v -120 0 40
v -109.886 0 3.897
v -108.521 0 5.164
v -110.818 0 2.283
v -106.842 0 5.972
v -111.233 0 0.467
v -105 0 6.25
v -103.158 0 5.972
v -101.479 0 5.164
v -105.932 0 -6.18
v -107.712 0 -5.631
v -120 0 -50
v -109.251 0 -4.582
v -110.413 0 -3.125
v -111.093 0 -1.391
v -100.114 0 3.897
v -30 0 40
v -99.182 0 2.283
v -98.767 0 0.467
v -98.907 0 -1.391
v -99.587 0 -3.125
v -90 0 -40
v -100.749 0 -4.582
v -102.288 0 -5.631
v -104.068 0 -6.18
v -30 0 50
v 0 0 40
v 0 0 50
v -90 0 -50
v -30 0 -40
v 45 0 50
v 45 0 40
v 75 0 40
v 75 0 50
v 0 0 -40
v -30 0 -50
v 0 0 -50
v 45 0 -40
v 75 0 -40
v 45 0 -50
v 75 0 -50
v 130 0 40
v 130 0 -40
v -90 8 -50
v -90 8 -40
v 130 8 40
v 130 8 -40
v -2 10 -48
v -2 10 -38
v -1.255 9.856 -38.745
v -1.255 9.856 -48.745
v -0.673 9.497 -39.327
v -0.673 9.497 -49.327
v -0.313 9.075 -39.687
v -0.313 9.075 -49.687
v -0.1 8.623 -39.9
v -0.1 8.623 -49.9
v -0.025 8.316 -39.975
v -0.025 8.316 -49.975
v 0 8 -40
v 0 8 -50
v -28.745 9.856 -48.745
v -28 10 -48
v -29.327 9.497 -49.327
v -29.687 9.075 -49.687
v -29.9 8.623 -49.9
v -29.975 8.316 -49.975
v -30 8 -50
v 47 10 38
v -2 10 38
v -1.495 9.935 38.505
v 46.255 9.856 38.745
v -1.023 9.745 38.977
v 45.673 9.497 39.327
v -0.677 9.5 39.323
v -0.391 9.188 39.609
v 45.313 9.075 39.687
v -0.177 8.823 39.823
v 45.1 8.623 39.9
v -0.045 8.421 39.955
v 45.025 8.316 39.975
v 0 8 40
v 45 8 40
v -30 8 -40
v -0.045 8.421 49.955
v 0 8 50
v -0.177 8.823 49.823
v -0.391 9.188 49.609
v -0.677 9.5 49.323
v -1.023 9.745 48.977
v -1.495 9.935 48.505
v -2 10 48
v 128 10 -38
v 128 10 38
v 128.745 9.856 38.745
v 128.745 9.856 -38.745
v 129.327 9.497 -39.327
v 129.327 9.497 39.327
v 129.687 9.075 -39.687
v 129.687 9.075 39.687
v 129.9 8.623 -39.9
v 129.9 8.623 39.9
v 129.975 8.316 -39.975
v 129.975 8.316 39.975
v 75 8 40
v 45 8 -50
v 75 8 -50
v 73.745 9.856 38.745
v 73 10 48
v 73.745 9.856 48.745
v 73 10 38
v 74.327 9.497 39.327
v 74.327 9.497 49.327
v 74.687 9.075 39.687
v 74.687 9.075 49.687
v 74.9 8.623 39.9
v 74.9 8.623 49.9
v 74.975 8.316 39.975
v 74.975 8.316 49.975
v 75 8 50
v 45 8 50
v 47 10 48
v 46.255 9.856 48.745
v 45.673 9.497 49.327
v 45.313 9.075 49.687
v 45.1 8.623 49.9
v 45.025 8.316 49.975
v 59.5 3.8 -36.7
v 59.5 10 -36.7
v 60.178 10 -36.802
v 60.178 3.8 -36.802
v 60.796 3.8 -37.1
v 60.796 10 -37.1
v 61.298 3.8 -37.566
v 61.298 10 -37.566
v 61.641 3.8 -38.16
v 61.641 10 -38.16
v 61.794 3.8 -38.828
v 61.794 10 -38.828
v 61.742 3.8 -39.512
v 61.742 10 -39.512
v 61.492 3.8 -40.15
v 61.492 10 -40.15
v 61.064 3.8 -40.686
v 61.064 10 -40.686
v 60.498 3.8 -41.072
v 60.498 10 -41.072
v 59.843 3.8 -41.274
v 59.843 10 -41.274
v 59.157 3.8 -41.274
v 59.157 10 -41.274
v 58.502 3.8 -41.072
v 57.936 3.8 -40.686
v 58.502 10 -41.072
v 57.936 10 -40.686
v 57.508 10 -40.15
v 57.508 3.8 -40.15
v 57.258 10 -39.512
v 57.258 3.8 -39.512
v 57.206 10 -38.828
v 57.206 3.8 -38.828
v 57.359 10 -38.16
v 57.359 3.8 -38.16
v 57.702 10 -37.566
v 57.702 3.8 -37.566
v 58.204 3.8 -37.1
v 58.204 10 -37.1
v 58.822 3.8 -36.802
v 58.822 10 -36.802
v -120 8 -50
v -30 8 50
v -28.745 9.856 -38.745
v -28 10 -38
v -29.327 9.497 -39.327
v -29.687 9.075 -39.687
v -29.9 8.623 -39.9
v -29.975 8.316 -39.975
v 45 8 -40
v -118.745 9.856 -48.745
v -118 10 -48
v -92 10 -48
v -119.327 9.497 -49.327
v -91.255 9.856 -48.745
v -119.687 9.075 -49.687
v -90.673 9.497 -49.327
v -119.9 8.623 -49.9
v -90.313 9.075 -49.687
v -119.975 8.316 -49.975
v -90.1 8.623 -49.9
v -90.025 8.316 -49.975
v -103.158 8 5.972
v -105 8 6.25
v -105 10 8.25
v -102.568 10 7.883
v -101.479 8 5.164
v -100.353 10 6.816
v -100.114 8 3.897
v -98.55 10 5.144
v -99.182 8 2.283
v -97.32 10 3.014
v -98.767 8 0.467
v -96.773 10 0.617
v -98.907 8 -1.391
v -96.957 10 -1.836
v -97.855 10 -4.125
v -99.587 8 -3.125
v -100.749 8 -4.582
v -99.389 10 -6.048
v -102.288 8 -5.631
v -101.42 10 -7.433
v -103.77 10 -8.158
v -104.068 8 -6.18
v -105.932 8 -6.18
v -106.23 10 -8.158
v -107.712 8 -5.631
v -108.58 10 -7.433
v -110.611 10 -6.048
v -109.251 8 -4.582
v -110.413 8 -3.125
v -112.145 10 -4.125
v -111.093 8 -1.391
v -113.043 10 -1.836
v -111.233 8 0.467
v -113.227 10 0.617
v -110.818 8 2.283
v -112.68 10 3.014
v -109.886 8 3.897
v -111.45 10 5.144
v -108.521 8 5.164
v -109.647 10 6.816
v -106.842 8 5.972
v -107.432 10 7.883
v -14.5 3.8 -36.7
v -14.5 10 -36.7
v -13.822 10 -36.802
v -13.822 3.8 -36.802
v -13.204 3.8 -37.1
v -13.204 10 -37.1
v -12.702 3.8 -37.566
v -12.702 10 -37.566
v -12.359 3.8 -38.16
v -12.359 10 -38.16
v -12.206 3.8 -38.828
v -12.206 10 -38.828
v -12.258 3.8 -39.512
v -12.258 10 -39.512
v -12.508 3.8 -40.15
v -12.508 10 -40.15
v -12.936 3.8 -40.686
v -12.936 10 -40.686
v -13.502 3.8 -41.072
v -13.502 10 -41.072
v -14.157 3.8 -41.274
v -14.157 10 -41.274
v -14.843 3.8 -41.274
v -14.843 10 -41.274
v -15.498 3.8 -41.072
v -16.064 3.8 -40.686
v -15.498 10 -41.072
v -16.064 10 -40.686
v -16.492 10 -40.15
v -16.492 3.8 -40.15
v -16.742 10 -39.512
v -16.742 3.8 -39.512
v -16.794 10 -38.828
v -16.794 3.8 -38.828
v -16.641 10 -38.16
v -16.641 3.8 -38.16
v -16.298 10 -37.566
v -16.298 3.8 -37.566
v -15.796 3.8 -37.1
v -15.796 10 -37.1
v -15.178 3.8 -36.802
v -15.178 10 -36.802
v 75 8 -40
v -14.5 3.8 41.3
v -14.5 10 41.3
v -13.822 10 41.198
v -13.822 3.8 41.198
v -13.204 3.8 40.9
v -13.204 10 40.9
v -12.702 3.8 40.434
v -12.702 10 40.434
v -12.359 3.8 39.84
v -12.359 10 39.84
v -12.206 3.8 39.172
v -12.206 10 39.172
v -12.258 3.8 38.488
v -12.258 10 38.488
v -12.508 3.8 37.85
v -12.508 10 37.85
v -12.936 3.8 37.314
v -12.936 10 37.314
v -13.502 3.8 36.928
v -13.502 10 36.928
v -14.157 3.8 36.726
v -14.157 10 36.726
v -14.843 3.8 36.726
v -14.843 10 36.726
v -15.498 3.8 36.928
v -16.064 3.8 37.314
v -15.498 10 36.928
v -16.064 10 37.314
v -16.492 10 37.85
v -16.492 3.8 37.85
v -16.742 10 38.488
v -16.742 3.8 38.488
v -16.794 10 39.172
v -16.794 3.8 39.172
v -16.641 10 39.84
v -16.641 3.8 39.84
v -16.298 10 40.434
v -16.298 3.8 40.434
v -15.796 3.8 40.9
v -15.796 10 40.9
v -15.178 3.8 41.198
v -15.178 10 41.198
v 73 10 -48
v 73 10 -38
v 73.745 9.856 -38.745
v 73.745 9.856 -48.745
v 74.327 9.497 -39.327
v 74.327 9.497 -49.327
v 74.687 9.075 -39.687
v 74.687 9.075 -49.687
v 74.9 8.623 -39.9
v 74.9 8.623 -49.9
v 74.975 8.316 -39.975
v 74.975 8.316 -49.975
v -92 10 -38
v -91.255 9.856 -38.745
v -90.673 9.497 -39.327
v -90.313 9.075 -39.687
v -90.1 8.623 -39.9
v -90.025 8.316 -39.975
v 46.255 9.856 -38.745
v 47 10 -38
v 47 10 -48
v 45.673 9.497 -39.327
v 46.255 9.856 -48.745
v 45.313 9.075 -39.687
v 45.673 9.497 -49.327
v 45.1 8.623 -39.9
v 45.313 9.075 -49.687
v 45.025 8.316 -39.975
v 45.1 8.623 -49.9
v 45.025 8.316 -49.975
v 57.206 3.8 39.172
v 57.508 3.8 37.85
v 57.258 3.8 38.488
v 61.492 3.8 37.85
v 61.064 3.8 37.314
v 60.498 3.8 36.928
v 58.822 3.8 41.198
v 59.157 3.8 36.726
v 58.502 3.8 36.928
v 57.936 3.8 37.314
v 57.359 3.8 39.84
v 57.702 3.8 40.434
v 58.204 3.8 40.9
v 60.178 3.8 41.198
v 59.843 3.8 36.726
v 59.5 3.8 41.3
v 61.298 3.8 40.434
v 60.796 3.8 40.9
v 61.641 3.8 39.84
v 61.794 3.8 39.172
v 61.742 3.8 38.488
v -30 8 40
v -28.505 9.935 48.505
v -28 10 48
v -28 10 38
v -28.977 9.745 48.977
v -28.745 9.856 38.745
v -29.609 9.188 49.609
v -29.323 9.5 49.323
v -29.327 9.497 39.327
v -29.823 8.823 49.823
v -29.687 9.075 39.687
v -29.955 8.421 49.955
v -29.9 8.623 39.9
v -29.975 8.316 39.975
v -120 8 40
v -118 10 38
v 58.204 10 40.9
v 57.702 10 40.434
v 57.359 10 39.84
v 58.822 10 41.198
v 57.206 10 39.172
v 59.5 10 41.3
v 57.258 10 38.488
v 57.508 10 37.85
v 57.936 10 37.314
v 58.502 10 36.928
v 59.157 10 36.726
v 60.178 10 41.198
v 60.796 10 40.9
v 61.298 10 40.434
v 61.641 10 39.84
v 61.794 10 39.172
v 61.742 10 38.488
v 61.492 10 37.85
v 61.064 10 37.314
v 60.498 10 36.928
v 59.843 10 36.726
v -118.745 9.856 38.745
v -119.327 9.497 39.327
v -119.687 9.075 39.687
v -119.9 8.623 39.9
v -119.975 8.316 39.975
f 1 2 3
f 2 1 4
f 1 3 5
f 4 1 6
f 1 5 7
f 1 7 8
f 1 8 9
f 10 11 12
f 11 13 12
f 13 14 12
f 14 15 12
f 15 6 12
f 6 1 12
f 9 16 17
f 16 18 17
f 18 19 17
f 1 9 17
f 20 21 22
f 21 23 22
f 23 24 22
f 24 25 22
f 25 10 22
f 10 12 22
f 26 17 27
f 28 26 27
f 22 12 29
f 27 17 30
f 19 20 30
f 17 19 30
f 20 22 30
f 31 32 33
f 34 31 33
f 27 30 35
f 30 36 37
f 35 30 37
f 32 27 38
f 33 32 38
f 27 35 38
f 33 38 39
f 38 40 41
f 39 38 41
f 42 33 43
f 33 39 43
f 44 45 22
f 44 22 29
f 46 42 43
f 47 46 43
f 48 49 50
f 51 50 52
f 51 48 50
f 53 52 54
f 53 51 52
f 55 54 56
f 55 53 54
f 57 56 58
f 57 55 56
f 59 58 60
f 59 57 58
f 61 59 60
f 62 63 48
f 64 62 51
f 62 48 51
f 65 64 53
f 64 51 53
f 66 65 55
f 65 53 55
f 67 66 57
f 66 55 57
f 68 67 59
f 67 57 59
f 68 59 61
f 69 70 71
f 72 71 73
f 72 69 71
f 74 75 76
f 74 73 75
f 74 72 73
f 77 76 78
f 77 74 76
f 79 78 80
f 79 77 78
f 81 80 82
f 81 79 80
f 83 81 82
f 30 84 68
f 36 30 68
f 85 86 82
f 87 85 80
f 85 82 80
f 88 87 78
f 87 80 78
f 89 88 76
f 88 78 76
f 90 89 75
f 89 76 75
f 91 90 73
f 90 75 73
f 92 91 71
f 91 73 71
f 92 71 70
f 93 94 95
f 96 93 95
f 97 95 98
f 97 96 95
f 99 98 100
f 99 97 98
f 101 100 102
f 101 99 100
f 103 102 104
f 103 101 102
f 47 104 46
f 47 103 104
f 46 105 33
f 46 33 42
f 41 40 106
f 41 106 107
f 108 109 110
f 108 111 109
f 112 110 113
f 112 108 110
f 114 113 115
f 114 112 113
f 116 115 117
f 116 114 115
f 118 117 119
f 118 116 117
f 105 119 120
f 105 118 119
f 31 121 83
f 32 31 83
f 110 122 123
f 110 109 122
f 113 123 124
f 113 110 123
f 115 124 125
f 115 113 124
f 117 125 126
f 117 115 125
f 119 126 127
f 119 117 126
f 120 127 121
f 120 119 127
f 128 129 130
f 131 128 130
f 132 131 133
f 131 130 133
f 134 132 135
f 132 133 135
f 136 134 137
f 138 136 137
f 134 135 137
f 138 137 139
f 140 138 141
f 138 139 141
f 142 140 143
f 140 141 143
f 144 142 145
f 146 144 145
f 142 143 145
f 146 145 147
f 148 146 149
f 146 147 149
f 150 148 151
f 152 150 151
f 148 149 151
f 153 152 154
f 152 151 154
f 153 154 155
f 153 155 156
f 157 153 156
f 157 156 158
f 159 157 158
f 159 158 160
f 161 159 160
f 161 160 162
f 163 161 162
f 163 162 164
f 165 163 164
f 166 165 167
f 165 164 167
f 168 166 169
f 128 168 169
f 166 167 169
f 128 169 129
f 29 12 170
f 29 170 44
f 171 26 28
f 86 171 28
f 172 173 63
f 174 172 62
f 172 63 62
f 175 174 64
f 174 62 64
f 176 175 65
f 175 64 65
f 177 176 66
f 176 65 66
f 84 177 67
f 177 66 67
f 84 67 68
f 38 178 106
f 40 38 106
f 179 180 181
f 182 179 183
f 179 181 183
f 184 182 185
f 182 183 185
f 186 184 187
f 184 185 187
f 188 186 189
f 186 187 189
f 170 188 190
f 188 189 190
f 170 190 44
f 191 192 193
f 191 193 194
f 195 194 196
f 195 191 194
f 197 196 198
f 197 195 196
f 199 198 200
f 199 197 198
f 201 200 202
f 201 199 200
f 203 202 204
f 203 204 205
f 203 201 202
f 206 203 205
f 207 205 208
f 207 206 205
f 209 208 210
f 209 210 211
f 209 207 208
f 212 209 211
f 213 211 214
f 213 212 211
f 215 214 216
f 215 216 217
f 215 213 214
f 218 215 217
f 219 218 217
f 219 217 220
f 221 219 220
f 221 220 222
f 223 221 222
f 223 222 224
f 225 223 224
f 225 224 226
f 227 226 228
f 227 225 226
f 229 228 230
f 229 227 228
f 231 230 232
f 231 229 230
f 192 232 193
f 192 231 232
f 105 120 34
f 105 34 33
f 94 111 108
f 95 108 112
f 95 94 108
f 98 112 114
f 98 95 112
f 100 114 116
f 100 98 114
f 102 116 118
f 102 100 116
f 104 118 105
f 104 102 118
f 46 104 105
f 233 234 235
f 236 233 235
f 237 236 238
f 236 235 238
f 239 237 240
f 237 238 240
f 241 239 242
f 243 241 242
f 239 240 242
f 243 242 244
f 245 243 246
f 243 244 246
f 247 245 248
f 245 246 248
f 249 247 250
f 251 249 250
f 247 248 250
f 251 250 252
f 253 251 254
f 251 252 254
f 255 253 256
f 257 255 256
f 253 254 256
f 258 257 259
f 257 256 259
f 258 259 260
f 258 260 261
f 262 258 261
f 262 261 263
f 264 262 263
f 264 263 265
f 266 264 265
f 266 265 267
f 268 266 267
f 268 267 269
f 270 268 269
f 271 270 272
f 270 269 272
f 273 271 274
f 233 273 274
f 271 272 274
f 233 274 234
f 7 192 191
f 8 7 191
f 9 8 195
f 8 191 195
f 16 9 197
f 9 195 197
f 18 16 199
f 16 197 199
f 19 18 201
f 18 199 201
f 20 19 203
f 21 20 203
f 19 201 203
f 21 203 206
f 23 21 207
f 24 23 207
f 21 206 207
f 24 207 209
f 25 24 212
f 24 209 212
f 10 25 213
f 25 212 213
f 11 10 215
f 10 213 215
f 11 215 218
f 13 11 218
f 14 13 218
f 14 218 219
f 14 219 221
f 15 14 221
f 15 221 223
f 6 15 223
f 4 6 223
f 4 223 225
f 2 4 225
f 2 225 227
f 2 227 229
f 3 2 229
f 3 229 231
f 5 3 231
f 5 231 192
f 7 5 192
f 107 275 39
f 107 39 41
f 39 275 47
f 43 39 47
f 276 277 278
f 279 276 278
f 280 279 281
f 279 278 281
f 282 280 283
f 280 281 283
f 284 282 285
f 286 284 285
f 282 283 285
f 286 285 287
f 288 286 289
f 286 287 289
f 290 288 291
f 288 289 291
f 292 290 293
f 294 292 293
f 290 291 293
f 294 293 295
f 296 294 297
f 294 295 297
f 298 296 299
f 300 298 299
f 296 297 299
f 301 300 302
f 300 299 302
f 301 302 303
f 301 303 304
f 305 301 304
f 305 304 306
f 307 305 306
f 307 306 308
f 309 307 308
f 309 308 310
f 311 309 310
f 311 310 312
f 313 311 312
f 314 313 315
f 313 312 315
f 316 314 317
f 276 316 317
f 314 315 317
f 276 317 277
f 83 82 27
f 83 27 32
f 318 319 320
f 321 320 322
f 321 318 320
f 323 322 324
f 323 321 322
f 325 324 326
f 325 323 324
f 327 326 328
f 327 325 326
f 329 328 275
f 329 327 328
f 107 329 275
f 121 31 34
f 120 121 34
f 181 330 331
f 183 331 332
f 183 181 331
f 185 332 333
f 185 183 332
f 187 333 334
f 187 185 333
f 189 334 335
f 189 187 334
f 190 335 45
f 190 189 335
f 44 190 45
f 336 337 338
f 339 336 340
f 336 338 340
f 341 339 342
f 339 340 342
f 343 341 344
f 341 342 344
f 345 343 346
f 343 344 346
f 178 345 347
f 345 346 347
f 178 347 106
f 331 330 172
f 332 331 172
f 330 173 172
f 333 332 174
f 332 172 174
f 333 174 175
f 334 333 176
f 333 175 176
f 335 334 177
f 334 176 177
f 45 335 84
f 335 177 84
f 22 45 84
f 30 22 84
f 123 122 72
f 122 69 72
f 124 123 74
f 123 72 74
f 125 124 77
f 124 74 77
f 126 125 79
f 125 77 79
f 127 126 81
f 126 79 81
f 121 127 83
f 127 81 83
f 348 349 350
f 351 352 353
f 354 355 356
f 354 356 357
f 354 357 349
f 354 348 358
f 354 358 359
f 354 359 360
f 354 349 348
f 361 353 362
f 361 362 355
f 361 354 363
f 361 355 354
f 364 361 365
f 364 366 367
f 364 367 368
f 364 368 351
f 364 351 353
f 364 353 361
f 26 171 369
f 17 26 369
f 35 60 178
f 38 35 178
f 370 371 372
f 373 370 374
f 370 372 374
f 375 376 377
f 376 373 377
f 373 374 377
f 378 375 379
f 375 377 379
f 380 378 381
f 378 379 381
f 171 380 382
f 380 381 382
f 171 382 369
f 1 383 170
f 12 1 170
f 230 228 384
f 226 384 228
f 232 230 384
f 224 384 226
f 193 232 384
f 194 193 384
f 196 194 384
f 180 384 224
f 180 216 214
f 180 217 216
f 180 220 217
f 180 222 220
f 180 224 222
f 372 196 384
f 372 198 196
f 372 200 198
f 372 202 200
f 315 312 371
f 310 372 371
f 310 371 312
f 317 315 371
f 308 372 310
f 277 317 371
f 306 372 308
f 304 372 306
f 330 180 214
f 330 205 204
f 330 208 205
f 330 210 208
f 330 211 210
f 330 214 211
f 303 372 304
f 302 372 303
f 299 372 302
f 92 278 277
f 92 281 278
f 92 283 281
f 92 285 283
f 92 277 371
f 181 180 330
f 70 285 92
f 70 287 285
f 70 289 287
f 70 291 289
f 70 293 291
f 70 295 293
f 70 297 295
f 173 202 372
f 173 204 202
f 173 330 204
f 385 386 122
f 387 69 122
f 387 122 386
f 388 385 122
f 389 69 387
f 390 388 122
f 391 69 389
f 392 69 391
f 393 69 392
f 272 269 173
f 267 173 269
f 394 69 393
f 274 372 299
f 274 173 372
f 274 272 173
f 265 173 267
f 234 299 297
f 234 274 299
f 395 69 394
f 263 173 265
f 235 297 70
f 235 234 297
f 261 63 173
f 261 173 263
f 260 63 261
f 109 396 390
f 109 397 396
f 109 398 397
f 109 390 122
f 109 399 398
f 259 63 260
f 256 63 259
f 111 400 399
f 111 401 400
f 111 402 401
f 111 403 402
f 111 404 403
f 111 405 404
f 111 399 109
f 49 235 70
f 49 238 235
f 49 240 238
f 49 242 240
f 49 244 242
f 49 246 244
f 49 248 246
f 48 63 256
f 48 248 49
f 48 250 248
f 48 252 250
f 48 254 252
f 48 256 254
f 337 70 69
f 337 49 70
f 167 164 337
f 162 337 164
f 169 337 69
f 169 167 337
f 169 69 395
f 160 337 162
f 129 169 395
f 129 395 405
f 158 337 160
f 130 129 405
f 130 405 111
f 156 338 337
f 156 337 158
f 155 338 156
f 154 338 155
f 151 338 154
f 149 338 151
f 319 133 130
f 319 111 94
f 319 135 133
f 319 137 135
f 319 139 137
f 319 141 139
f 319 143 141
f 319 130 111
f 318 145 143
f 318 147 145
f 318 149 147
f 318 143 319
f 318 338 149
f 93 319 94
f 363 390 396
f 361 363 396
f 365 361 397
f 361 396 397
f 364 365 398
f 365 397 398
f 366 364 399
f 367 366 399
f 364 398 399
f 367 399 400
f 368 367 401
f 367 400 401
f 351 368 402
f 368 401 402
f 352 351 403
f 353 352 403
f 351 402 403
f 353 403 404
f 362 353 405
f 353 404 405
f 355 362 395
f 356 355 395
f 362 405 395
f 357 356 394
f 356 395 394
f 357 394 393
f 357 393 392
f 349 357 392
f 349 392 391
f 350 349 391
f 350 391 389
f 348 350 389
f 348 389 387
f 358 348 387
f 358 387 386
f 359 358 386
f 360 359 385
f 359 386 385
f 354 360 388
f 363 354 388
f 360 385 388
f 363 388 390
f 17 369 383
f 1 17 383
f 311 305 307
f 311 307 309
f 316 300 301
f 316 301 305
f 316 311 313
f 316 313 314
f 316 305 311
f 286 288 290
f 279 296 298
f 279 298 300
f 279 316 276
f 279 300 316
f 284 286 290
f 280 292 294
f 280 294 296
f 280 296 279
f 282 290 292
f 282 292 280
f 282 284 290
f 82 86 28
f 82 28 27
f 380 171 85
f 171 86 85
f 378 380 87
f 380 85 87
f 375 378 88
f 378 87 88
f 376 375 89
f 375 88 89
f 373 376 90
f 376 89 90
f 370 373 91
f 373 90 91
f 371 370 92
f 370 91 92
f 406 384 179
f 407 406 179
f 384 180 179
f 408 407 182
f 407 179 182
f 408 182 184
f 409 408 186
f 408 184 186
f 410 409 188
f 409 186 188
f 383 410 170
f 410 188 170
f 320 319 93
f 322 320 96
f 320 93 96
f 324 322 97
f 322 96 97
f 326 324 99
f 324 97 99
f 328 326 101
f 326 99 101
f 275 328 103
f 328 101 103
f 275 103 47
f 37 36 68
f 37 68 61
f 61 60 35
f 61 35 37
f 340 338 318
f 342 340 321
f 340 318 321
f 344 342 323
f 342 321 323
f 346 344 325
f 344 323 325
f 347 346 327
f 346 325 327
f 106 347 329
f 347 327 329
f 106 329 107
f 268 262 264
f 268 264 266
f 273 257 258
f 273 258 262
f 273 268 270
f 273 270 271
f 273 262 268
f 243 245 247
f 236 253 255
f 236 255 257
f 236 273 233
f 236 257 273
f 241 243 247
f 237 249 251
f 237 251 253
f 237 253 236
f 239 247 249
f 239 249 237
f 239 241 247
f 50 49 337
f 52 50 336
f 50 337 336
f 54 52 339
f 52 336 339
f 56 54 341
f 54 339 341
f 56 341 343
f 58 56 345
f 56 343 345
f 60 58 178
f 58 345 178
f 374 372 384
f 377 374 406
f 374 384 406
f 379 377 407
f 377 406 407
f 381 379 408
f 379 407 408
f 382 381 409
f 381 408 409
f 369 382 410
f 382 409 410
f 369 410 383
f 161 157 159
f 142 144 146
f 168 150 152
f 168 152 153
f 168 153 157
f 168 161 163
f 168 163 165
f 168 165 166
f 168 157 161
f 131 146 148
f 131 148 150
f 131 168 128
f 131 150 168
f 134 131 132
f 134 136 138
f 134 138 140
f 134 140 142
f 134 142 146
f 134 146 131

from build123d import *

# Parameters (mm, degrees)
SKETCH1_W           = 260
SKETCH1_H           = 100
BOSS_EXTRUDE1_DEPTH = 10
SKETCH3_W           = 55
SKETCH3_H           = 10
SKETCH3_W_2         = 60
SKETCH3_W_3         = 45
CUT_EXTRUDE2_DEPTH  = 140.642400438
FILLET1_R           = 2
SKETCH2_R           = 6.25
CUT_EXTRUDE1_DEPTH  = 140.642400438
CHAMFER1_SIZE       = 2
SKETCH4_R           = 2.3
CUT_EXTRUDE3_DEPTH  = 6.2


with BuildPart() as part:
    # Sketch1 → Boss-Extrude1 (new body)
    with BuildSketch(Plane(origin=(0, 0, 0), x_dir=(1, 0, 0), z_dir=(0, 1, 0))):
        Rectangle(SKETCH1_W, SKETCH1_H)
    extrude(amount=BOSS_EXTRUDE1_DEPTH)

    # Sketch3 → Cut-Extrude2 (cut, through all)
    with BuildSketch(Plane(origin=(0, 10, 0), x_dir=(1, 0, 0), z_dir=(0, 1, 0))):
        with Locations((102.5, 45)):
            Rectangle(SKETCH3_W, SKETCH3_H)
        with Locations((102.5, -45)):
            Rectangle(SKETCH3_W, SKETCH3_H)
        Polygon((-130, -50), (-30, -50), (-30, -40), (-120, -40), (-120, 50), (-130, 50), (-130, -40), align=None)
        with Locations((-60, 45)):
            Rectangle(SKETCH3_W_2, SKETCH3_H)
        with Locations((22.5, 45)):
            Rectangle(SKETCH3_W_3, SKETCH3_H)
        with Locations((22.5, -45)):
            Rectangle(SKETCH3_W_3, SKETCH3_H)
    extrude(amount=-CUT_EXTRUDE2_DEPTH, mode=Mode.SUBTRACT)

    # Fillet1
    fillet1_edges = [part.edges().sort_by_distance(p)[0] for p in [
        (-15, 10, 50),
        (60, 10, 50),
        (130, 10, 0),
        (60, 10, -50),
        (-15, 10, -50),
        (-105, 10, -50),
        (0, 10, -45),
        (22.5, 10, -40),
        (45, 10, -45),
        (-90, 10, -45),
        (-60, 10, -40),
        (-30, 10, -45),
        (-30, 10, 45),
        (-75, 10, 40),
        (-120, 10, -5),
        (102.5, 10, 40),
        (75, 10, 45),
        (0, 10, 45),
        (45, 10, 45),
        (22.5, 10, 40),
        (75, 10, -45),
        (102.5, 10, -40),
    ]]
    fillet(fillet1_edges, radius=FILLET1_R)

    # Sketch2 → Cut-Extrude1 (cut, through all)
    with BuildSketch(Plane(origin=(0, 10, 0), x_dir=(1, 0, 0), z_dir=(0, 1, 0))):
        with Locations(Location((-105, 0, 0), (0, 0, 270))):
            Circle(SKETCH2_R)
    extrude(amount=-CUT_EXTRUDE1_DEPTH, mode=Mode.SUBTRACT)

    # Chamfer1
    chamfer1_edges = [part.edges().sort_by_distance(p)[0] for p in [
        (-105, 10, -6.25),
    ]]
    chamfer(chamfer1_edges, length=CHAMFER1_SIZE)

    # Sketch4 → Cut-Extrude3 (cut)
    with BuildSketch(Plane(origin=(0, 10, 0), x_dir=(1, 0, 0), z_dir=(0, 1, 0))):
        with Locations(Location((59.5, 39, 0), (0, 0, 270))):
            Circle(SKETCH4_R)
        with Locations(Location((-14.5, 39, 0), (0, 0, 270))):
            Circle(SKETCH4_R)
        with Locations(Location((59.5, -39, 0), (0, 0, 270))):
            Circle(SKETCH4_R)
        with Locations(Location((-14.5, -39, 0), (0, 0, 270))):
            Circle(SKETCH4_R)
    extrude(amount=-CUT_EXTRUDE3_DEPTH, mode=Mode.SUBTRACT)


solid = part.part
